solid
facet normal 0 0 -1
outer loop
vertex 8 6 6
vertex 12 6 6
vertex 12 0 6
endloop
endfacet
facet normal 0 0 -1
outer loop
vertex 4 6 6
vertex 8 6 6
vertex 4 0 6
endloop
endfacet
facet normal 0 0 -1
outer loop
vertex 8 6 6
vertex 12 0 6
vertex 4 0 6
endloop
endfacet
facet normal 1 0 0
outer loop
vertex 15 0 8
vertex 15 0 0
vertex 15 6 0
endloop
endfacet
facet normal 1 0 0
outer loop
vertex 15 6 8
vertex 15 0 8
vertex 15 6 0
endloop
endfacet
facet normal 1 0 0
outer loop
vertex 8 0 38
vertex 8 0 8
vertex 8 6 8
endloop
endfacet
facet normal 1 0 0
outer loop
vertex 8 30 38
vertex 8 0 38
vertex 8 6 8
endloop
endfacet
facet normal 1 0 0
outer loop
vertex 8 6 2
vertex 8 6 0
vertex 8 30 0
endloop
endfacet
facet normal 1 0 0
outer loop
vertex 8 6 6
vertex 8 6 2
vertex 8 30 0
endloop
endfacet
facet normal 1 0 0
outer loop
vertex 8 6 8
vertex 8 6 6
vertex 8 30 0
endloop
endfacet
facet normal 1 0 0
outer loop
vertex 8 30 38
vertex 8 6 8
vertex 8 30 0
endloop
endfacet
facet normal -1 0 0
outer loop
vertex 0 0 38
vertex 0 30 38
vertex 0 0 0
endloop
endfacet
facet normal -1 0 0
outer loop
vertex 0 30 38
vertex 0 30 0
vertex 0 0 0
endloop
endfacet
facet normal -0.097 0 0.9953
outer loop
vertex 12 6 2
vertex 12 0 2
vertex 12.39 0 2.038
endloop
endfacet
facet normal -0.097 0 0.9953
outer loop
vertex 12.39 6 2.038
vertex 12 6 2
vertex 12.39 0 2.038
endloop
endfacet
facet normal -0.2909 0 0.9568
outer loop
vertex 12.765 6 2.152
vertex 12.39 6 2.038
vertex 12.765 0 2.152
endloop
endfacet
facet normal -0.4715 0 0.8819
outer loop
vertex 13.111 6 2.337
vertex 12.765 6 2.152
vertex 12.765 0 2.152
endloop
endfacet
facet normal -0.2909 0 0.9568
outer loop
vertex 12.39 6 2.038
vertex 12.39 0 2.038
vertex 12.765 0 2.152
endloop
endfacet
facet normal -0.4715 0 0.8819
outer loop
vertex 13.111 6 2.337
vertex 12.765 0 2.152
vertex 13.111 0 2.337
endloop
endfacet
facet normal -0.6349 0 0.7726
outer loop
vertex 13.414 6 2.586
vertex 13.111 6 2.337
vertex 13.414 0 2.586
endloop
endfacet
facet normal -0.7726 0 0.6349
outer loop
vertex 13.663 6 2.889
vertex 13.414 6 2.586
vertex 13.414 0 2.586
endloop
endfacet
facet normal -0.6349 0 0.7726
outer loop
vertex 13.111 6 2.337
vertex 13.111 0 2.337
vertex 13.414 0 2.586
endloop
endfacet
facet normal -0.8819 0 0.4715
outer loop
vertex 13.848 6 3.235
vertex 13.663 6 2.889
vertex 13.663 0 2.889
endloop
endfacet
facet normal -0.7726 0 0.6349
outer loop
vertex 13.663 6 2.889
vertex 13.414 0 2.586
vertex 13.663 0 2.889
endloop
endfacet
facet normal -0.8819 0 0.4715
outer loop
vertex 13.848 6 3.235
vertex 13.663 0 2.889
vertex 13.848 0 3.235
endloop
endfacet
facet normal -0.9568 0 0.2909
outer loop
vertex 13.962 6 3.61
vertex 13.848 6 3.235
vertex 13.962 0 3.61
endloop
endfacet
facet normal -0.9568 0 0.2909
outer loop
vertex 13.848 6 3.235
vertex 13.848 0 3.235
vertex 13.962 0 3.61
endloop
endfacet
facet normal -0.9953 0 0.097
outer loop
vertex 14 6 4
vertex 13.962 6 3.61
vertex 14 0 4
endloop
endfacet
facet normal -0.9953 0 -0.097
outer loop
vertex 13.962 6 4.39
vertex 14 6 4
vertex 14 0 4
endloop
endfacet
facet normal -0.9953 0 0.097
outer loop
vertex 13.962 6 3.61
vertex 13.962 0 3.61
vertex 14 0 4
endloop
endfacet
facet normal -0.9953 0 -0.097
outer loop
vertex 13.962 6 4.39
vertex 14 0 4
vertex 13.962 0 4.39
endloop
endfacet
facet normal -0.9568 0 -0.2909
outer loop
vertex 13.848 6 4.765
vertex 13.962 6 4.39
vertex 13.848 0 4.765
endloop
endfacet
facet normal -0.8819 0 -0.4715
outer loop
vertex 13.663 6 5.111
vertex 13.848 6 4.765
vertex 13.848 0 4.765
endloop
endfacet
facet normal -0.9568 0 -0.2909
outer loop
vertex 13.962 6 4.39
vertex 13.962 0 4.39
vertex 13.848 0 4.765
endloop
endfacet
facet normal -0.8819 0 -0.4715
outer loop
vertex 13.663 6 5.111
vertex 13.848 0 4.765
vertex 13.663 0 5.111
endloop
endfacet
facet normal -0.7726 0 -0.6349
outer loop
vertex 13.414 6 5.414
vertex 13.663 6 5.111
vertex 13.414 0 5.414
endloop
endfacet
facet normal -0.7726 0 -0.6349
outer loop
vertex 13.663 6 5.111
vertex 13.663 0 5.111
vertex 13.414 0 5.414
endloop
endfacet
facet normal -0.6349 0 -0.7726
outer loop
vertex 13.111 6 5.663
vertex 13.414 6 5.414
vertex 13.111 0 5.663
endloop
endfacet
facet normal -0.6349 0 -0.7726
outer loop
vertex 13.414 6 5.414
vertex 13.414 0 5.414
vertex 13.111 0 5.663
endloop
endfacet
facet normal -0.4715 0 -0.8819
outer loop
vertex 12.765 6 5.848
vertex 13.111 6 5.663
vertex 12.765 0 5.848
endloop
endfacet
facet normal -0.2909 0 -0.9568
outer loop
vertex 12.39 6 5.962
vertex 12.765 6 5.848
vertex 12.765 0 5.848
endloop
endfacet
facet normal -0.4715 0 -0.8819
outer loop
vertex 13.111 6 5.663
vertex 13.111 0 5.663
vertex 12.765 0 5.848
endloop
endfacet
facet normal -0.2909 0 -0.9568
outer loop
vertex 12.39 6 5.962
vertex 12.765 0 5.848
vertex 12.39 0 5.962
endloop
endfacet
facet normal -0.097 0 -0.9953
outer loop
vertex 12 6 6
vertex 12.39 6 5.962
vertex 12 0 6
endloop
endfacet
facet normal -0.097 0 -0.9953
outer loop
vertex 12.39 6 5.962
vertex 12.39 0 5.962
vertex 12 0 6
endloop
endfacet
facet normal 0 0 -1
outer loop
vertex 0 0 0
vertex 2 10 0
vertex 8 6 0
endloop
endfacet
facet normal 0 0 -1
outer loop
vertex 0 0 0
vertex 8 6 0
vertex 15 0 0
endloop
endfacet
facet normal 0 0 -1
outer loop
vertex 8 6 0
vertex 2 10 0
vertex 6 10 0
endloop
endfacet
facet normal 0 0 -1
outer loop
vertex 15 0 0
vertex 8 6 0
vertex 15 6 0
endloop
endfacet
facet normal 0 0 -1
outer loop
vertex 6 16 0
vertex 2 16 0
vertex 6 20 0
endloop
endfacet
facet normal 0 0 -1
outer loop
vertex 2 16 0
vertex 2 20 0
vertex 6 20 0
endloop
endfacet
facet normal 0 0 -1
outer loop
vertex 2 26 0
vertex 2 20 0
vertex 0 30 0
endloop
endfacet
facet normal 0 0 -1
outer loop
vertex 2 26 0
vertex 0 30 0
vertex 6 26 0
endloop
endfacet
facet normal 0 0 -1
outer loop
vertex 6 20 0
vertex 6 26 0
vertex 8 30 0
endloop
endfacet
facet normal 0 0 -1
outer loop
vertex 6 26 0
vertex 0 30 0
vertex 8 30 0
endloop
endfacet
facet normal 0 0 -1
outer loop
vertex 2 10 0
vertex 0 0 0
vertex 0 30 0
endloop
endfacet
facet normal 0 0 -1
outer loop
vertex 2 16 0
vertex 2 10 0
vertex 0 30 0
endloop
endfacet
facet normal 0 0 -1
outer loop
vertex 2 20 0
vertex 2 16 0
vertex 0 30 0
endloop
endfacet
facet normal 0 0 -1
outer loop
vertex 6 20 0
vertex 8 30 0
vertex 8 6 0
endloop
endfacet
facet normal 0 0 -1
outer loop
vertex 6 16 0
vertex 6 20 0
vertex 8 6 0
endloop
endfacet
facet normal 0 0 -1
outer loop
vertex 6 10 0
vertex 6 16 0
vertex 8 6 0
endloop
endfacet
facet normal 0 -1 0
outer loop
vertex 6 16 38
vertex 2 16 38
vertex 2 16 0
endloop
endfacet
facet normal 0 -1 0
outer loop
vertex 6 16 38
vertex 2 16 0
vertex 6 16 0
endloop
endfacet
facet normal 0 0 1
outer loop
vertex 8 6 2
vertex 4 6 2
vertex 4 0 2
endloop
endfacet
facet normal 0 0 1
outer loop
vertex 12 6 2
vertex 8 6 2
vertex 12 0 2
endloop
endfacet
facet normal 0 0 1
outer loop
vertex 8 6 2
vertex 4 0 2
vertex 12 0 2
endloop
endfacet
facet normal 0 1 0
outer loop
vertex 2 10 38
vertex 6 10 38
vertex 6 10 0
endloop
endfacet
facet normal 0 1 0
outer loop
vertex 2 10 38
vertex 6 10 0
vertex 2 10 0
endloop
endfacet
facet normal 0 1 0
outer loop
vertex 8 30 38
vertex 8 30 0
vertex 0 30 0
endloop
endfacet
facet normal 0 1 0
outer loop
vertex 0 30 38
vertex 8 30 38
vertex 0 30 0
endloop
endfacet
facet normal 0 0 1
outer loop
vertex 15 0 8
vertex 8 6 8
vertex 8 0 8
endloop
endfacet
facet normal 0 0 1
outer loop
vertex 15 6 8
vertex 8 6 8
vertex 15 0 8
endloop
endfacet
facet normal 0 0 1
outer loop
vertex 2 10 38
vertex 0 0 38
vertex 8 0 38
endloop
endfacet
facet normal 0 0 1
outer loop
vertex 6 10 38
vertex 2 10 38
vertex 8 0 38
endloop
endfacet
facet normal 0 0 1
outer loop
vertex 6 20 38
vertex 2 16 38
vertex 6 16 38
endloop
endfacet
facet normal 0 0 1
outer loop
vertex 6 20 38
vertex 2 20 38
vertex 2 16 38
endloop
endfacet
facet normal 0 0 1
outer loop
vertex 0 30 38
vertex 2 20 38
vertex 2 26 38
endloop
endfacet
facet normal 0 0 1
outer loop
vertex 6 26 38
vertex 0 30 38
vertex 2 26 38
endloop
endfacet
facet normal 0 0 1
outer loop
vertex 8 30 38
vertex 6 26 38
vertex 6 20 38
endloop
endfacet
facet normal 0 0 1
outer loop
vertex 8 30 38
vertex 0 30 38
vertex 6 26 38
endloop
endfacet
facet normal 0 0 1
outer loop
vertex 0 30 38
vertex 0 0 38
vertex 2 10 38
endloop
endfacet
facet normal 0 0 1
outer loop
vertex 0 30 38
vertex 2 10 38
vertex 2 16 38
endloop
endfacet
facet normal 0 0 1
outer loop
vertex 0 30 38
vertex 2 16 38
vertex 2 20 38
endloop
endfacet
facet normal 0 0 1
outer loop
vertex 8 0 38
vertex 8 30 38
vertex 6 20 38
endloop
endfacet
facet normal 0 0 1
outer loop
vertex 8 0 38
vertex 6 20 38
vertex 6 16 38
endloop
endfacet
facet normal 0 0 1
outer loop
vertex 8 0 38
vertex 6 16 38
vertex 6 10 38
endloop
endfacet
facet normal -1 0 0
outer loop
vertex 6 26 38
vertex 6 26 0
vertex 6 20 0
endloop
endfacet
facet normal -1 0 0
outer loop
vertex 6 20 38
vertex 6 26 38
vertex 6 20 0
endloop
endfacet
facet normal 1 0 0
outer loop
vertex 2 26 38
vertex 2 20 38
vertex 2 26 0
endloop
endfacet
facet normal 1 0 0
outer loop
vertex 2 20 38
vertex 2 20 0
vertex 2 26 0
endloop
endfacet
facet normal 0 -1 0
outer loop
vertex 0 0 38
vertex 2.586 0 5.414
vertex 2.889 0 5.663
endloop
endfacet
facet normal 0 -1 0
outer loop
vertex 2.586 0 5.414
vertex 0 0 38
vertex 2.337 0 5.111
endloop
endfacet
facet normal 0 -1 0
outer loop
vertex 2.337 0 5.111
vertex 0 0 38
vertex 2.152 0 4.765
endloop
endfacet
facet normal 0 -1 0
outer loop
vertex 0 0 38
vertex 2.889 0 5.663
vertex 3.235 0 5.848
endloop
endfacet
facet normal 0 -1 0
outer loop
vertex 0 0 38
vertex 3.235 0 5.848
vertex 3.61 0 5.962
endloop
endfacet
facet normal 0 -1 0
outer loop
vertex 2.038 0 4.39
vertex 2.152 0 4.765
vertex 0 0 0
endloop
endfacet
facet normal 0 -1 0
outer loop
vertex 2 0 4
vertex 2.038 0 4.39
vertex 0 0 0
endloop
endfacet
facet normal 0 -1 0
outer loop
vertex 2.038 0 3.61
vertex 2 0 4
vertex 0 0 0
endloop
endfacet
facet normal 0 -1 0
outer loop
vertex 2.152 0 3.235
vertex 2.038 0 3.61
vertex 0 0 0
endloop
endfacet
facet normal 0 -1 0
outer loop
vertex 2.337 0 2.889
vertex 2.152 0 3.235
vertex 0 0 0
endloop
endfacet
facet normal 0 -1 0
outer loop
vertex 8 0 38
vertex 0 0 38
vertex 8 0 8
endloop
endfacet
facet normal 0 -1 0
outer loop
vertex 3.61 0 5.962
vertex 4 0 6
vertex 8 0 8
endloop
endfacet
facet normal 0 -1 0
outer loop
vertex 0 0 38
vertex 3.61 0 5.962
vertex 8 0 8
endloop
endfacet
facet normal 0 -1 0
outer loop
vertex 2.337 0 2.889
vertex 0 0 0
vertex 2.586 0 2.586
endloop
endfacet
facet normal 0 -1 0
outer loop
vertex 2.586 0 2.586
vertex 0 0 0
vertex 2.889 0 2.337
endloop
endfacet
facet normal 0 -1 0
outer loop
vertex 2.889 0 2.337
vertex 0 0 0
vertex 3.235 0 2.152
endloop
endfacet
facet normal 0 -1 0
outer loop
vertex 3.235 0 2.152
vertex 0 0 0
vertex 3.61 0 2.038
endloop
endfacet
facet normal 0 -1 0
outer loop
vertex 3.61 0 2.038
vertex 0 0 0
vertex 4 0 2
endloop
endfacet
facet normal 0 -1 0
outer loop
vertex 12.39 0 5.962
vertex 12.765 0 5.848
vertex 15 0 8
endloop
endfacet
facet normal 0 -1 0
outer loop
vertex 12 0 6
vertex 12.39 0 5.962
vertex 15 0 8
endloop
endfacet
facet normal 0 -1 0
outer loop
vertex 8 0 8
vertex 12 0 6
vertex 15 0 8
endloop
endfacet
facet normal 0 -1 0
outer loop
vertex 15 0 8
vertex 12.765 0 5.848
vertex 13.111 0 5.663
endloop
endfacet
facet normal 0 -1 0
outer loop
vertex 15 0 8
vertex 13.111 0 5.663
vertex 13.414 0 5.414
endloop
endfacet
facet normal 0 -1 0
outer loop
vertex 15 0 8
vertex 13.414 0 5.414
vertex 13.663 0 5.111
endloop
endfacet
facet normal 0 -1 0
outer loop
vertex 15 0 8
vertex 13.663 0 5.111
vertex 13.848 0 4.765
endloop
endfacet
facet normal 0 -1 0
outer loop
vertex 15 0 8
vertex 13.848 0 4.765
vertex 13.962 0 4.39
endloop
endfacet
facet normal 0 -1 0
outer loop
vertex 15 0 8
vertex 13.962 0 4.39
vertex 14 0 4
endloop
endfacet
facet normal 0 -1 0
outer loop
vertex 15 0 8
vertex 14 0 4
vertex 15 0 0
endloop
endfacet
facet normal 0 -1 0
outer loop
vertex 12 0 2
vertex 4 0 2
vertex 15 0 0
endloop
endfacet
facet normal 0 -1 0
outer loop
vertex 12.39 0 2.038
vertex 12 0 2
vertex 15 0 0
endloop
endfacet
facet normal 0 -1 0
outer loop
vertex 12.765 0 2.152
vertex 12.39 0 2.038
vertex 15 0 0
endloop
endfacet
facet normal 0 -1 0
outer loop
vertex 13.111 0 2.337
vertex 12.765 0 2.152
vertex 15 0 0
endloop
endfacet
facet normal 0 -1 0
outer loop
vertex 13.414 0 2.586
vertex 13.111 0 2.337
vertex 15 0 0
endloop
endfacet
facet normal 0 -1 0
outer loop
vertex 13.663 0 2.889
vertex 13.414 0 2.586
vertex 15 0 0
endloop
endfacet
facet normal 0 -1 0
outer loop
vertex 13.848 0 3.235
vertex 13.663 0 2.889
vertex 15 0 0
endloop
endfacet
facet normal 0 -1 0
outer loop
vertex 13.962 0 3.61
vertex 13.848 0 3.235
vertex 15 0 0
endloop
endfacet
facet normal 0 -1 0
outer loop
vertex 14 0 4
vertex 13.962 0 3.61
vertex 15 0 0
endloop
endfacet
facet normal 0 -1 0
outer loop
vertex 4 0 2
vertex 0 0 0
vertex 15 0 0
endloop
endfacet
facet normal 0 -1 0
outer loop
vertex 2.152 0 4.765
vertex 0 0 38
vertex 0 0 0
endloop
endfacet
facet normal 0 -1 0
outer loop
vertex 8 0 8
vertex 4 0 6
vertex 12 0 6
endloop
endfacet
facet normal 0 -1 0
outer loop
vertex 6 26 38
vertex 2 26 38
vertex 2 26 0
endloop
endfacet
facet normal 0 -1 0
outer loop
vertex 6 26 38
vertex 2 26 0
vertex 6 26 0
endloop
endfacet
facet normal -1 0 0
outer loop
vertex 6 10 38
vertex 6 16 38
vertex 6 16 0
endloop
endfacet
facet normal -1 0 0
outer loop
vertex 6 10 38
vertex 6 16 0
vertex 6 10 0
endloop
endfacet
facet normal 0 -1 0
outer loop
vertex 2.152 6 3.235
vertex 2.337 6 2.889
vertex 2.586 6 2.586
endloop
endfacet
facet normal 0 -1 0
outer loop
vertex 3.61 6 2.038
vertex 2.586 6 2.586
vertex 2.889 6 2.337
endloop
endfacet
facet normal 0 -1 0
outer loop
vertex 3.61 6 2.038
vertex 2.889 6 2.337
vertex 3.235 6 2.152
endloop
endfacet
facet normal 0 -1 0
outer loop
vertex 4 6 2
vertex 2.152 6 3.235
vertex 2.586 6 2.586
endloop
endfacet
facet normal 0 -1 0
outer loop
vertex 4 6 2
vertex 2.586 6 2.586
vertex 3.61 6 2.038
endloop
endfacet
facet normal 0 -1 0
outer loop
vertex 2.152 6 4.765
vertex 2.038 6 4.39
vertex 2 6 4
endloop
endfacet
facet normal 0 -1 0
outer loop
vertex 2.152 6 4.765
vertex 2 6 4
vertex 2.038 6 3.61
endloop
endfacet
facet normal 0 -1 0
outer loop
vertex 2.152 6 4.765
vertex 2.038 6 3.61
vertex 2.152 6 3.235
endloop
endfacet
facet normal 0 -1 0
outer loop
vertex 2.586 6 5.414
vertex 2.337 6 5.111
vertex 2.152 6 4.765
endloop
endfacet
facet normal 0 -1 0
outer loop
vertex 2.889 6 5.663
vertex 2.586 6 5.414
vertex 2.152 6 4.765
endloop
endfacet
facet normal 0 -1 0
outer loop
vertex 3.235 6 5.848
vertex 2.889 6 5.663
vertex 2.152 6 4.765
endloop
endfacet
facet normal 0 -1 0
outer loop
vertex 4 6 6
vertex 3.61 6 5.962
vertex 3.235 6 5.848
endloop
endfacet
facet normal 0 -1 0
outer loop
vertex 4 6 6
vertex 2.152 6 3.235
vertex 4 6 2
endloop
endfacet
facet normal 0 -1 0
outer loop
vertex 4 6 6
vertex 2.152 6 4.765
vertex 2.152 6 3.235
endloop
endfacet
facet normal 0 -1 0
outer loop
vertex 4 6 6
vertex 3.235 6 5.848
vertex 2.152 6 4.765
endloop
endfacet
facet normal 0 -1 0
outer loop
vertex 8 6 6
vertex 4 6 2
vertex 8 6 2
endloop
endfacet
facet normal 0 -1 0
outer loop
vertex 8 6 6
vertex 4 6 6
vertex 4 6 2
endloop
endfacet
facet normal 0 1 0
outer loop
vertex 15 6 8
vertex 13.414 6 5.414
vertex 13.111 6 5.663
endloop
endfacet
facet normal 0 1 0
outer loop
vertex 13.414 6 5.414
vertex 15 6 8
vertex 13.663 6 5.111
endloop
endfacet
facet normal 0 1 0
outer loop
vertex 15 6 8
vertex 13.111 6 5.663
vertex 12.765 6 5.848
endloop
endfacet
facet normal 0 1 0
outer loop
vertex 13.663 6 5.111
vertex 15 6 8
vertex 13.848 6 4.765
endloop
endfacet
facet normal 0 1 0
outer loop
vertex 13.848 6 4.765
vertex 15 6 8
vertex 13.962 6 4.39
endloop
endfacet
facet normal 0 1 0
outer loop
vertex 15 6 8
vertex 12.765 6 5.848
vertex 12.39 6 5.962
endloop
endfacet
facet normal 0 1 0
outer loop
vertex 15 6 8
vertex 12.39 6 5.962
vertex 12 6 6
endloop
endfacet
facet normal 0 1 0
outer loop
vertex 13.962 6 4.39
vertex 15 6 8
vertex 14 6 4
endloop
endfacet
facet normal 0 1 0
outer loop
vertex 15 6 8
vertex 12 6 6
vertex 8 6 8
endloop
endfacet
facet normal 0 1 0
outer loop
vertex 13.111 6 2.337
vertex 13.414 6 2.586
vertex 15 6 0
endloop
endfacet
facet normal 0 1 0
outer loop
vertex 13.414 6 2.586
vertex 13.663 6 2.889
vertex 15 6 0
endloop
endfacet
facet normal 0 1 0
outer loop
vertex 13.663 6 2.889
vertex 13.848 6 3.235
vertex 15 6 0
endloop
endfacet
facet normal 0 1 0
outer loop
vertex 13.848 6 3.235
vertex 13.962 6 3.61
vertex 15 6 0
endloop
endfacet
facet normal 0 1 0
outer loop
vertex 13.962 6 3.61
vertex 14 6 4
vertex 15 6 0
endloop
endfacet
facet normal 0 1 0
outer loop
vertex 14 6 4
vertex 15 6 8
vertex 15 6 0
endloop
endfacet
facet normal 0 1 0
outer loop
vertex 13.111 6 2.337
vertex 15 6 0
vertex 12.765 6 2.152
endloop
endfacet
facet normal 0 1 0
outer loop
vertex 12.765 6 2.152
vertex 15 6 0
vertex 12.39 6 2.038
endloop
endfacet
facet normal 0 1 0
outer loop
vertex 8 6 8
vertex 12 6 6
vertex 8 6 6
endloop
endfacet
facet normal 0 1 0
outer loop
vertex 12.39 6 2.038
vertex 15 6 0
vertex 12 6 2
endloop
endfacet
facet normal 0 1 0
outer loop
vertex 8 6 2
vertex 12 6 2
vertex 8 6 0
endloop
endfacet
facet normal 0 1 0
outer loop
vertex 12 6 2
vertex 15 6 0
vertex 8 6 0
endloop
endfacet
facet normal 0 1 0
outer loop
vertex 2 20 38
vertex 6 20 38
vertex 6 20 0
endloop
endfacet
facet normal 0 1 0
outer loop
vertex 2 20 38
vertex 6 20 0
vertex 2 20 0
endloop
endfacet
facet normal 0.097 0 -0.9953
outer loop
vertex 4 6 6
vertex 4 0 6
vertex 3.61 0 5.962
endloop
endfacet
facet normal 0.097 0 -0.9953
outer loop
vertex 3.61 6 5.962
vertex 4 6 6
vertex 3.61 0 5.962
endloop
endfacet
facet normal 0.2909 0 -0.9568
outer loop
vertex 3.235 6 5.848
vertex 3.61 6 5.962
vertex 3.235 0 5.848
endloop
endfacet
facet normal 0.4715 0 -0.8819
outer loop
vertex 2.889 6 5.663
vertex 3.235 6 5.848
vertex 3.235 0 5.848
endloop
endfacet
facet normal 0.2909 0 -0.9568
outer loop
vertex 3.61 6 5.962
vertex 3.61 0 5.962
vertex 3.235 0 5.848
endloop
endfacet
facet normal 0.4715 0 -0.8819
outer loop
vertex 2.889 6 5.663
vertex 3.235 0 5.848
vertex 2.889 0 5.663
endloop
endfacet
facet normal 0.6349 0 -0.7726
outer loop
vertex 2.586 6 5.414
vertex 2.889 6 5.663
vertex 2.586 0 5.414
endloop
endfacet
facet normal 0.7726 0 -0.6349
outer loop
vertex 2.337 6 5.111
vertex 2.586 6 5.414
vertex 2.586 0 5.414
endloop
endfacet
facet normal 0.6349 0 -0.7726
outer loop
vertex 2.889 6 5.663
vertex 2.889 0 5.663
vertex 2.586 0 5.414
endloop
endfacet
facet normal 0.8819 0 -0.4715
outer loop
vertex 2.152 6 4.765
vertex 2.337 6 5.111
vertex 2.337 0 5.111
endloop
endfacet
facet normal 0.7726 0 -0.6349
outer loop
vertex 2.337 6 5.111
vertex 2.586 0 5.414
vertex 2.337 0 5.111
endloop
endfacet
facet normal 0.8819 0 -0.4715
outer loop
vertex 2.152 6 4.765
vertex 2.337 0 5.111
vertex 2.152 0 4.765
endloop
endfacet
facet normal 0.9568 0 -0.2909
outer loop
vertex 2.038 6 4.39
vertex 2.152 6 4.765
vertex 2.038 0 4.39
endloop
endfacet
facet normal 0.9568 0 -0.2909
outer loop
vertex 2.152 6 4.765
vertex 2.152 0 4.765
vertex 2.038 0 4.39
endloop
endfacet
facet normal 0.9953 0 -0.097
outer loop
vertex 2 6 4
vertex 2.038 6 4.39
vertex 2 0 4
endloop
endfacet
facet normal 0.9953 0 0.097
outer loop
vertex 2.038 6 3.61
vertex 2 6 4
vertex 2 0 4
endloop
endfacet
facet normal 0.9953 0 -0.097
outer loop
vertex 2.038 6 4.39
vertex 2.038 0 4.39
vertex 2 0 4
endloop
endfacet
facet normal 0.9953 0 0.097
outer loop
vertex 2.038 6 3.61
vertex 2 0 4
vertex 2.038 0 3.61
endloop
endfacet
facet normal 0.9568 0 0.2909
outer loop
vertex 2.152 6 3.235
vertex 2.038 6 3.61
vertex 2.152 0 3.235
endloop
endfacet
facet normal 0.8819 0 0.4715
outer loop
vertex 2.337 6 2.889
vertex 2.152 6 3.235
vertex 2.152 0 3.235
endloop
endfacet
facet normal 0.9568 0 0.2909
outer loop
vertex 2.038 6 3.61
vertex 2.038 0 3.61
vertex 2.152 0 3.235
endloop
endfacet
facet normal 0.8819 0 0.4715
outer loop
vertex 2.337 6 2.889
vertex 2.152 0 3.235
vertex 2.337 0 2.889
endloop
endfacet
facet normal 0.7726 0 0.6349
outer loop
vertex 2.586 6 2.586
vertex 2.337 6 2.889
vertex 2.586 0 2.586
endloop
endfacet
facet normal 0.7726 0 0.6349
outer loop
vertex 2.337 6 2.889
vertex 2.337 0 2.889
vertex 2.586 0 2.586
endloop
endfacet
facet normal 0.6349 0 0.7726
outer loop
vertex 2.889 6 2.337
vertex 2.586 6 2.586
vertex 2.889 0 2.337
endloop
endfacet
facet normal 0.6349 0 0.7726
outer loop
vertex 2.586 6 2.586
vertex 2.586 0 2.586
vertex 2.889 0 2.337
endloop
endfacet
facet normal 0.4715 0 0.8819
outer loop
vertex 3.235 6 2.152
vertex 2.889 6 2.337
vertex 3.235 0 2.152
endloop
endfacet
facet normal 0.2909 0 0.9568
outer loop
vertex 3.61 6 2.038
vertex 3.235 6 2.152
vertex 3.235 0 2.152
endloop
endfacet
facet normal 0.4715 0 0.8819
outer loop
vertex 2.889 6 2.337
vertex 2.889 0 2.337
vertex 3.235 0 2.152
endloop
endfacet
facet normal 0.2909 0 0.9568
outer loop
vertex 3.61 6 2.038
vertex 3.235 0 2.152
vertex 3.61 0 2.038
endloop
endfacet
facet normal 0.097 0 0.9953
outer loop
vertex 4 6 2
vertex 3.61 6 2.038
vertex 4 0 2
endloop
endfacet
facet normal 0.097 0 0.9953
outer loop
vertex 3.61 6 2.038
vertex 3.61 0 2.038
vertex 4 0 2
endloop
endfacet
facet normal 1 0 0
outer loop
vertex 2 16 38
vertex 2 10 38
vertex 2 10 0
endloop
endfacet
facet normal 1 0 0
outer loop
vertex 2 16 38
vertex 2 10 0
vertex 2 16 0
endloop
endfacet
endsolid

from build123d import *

# Parameters (mm, degrees)
SKETCH_1_W          = 4
SKETCH_1_H          = 6
EXTRUDE_1_DEPTH     = 8
EXTRUDE_START       = 8
SKETCH_1_3_W        = 4
SKETCH_1_3_H        = 6
EXTRUDE_2_DEPTH     = 30
CUT_EXTRUDE_1_DEPTH = 6


with BuildPart() as part:
    # Эскиз1 → Бобышка-Вытянуть1 (new body)
    with BuildSketch(Plane.XY):
        Polygon((0, 30), (0, 0), (15, 0), (15, 6), (8, 6), (8, 30), align=None)
        with Locations((4, 23)):
            Rectangle(SKETCH_1_W, SKETCH_1_H, mode=Mode.SUBTRACT)
        with Locations((4, 13)):
            Rectangle(SKETCH_1_W, SKETCH_1_H, mode=Mode.SUBTRACT)
    extrude(amount=EXTRUDE_1_DEPTH)

    # Эскиз1<3> → Бобышка-Вытянуть2 (add)
    with BuildSketch(Plane.XY.offset(EXTRUDE_START)):
        Polygon((8, 30), (4, 30), (4, 26), (6, 26), (6, 20), (4, 20), (4, 16), (6, 16), (6, 10), (4, 10), (4, 6), (8, 6), align=None)
        Polygon((4, 30), (0, 30), (0, 6), (4, 6), (4, 10), (2, 10), (2, 16), (4, 16), (4, 20), (2, 20), (2, 26), (4, 26), align=None)
        with Locations((2, 3)):
            Rectangle(SKETCH_1_3_W, SKETCH_1_3_H)
        with Locations((6, 3)):
            Rectangle(SKETCH_1_3_W, SKETCH_1_3_H)
    extrude(amount=EXTRUDE_2_DEPTH)

    # Эскиз2 → Вырез-Вытянуть1 (cut)
    with BuildSketch(Plane.XZ):
        with BuildLine():
            Line((4, 2), (12, 2))
            ThreePointArc((12, 2), (14, 4), (12, 6))
            Line((12, 6), (4, 6))
            ThreePointArc((4, 6), (2, 4), (4, 2))
        make_face()
    extrude(amount=-CUT_EXTRUDE_1_DEPTH, mode=Mode.SUBTRACT)


solid = part.part
